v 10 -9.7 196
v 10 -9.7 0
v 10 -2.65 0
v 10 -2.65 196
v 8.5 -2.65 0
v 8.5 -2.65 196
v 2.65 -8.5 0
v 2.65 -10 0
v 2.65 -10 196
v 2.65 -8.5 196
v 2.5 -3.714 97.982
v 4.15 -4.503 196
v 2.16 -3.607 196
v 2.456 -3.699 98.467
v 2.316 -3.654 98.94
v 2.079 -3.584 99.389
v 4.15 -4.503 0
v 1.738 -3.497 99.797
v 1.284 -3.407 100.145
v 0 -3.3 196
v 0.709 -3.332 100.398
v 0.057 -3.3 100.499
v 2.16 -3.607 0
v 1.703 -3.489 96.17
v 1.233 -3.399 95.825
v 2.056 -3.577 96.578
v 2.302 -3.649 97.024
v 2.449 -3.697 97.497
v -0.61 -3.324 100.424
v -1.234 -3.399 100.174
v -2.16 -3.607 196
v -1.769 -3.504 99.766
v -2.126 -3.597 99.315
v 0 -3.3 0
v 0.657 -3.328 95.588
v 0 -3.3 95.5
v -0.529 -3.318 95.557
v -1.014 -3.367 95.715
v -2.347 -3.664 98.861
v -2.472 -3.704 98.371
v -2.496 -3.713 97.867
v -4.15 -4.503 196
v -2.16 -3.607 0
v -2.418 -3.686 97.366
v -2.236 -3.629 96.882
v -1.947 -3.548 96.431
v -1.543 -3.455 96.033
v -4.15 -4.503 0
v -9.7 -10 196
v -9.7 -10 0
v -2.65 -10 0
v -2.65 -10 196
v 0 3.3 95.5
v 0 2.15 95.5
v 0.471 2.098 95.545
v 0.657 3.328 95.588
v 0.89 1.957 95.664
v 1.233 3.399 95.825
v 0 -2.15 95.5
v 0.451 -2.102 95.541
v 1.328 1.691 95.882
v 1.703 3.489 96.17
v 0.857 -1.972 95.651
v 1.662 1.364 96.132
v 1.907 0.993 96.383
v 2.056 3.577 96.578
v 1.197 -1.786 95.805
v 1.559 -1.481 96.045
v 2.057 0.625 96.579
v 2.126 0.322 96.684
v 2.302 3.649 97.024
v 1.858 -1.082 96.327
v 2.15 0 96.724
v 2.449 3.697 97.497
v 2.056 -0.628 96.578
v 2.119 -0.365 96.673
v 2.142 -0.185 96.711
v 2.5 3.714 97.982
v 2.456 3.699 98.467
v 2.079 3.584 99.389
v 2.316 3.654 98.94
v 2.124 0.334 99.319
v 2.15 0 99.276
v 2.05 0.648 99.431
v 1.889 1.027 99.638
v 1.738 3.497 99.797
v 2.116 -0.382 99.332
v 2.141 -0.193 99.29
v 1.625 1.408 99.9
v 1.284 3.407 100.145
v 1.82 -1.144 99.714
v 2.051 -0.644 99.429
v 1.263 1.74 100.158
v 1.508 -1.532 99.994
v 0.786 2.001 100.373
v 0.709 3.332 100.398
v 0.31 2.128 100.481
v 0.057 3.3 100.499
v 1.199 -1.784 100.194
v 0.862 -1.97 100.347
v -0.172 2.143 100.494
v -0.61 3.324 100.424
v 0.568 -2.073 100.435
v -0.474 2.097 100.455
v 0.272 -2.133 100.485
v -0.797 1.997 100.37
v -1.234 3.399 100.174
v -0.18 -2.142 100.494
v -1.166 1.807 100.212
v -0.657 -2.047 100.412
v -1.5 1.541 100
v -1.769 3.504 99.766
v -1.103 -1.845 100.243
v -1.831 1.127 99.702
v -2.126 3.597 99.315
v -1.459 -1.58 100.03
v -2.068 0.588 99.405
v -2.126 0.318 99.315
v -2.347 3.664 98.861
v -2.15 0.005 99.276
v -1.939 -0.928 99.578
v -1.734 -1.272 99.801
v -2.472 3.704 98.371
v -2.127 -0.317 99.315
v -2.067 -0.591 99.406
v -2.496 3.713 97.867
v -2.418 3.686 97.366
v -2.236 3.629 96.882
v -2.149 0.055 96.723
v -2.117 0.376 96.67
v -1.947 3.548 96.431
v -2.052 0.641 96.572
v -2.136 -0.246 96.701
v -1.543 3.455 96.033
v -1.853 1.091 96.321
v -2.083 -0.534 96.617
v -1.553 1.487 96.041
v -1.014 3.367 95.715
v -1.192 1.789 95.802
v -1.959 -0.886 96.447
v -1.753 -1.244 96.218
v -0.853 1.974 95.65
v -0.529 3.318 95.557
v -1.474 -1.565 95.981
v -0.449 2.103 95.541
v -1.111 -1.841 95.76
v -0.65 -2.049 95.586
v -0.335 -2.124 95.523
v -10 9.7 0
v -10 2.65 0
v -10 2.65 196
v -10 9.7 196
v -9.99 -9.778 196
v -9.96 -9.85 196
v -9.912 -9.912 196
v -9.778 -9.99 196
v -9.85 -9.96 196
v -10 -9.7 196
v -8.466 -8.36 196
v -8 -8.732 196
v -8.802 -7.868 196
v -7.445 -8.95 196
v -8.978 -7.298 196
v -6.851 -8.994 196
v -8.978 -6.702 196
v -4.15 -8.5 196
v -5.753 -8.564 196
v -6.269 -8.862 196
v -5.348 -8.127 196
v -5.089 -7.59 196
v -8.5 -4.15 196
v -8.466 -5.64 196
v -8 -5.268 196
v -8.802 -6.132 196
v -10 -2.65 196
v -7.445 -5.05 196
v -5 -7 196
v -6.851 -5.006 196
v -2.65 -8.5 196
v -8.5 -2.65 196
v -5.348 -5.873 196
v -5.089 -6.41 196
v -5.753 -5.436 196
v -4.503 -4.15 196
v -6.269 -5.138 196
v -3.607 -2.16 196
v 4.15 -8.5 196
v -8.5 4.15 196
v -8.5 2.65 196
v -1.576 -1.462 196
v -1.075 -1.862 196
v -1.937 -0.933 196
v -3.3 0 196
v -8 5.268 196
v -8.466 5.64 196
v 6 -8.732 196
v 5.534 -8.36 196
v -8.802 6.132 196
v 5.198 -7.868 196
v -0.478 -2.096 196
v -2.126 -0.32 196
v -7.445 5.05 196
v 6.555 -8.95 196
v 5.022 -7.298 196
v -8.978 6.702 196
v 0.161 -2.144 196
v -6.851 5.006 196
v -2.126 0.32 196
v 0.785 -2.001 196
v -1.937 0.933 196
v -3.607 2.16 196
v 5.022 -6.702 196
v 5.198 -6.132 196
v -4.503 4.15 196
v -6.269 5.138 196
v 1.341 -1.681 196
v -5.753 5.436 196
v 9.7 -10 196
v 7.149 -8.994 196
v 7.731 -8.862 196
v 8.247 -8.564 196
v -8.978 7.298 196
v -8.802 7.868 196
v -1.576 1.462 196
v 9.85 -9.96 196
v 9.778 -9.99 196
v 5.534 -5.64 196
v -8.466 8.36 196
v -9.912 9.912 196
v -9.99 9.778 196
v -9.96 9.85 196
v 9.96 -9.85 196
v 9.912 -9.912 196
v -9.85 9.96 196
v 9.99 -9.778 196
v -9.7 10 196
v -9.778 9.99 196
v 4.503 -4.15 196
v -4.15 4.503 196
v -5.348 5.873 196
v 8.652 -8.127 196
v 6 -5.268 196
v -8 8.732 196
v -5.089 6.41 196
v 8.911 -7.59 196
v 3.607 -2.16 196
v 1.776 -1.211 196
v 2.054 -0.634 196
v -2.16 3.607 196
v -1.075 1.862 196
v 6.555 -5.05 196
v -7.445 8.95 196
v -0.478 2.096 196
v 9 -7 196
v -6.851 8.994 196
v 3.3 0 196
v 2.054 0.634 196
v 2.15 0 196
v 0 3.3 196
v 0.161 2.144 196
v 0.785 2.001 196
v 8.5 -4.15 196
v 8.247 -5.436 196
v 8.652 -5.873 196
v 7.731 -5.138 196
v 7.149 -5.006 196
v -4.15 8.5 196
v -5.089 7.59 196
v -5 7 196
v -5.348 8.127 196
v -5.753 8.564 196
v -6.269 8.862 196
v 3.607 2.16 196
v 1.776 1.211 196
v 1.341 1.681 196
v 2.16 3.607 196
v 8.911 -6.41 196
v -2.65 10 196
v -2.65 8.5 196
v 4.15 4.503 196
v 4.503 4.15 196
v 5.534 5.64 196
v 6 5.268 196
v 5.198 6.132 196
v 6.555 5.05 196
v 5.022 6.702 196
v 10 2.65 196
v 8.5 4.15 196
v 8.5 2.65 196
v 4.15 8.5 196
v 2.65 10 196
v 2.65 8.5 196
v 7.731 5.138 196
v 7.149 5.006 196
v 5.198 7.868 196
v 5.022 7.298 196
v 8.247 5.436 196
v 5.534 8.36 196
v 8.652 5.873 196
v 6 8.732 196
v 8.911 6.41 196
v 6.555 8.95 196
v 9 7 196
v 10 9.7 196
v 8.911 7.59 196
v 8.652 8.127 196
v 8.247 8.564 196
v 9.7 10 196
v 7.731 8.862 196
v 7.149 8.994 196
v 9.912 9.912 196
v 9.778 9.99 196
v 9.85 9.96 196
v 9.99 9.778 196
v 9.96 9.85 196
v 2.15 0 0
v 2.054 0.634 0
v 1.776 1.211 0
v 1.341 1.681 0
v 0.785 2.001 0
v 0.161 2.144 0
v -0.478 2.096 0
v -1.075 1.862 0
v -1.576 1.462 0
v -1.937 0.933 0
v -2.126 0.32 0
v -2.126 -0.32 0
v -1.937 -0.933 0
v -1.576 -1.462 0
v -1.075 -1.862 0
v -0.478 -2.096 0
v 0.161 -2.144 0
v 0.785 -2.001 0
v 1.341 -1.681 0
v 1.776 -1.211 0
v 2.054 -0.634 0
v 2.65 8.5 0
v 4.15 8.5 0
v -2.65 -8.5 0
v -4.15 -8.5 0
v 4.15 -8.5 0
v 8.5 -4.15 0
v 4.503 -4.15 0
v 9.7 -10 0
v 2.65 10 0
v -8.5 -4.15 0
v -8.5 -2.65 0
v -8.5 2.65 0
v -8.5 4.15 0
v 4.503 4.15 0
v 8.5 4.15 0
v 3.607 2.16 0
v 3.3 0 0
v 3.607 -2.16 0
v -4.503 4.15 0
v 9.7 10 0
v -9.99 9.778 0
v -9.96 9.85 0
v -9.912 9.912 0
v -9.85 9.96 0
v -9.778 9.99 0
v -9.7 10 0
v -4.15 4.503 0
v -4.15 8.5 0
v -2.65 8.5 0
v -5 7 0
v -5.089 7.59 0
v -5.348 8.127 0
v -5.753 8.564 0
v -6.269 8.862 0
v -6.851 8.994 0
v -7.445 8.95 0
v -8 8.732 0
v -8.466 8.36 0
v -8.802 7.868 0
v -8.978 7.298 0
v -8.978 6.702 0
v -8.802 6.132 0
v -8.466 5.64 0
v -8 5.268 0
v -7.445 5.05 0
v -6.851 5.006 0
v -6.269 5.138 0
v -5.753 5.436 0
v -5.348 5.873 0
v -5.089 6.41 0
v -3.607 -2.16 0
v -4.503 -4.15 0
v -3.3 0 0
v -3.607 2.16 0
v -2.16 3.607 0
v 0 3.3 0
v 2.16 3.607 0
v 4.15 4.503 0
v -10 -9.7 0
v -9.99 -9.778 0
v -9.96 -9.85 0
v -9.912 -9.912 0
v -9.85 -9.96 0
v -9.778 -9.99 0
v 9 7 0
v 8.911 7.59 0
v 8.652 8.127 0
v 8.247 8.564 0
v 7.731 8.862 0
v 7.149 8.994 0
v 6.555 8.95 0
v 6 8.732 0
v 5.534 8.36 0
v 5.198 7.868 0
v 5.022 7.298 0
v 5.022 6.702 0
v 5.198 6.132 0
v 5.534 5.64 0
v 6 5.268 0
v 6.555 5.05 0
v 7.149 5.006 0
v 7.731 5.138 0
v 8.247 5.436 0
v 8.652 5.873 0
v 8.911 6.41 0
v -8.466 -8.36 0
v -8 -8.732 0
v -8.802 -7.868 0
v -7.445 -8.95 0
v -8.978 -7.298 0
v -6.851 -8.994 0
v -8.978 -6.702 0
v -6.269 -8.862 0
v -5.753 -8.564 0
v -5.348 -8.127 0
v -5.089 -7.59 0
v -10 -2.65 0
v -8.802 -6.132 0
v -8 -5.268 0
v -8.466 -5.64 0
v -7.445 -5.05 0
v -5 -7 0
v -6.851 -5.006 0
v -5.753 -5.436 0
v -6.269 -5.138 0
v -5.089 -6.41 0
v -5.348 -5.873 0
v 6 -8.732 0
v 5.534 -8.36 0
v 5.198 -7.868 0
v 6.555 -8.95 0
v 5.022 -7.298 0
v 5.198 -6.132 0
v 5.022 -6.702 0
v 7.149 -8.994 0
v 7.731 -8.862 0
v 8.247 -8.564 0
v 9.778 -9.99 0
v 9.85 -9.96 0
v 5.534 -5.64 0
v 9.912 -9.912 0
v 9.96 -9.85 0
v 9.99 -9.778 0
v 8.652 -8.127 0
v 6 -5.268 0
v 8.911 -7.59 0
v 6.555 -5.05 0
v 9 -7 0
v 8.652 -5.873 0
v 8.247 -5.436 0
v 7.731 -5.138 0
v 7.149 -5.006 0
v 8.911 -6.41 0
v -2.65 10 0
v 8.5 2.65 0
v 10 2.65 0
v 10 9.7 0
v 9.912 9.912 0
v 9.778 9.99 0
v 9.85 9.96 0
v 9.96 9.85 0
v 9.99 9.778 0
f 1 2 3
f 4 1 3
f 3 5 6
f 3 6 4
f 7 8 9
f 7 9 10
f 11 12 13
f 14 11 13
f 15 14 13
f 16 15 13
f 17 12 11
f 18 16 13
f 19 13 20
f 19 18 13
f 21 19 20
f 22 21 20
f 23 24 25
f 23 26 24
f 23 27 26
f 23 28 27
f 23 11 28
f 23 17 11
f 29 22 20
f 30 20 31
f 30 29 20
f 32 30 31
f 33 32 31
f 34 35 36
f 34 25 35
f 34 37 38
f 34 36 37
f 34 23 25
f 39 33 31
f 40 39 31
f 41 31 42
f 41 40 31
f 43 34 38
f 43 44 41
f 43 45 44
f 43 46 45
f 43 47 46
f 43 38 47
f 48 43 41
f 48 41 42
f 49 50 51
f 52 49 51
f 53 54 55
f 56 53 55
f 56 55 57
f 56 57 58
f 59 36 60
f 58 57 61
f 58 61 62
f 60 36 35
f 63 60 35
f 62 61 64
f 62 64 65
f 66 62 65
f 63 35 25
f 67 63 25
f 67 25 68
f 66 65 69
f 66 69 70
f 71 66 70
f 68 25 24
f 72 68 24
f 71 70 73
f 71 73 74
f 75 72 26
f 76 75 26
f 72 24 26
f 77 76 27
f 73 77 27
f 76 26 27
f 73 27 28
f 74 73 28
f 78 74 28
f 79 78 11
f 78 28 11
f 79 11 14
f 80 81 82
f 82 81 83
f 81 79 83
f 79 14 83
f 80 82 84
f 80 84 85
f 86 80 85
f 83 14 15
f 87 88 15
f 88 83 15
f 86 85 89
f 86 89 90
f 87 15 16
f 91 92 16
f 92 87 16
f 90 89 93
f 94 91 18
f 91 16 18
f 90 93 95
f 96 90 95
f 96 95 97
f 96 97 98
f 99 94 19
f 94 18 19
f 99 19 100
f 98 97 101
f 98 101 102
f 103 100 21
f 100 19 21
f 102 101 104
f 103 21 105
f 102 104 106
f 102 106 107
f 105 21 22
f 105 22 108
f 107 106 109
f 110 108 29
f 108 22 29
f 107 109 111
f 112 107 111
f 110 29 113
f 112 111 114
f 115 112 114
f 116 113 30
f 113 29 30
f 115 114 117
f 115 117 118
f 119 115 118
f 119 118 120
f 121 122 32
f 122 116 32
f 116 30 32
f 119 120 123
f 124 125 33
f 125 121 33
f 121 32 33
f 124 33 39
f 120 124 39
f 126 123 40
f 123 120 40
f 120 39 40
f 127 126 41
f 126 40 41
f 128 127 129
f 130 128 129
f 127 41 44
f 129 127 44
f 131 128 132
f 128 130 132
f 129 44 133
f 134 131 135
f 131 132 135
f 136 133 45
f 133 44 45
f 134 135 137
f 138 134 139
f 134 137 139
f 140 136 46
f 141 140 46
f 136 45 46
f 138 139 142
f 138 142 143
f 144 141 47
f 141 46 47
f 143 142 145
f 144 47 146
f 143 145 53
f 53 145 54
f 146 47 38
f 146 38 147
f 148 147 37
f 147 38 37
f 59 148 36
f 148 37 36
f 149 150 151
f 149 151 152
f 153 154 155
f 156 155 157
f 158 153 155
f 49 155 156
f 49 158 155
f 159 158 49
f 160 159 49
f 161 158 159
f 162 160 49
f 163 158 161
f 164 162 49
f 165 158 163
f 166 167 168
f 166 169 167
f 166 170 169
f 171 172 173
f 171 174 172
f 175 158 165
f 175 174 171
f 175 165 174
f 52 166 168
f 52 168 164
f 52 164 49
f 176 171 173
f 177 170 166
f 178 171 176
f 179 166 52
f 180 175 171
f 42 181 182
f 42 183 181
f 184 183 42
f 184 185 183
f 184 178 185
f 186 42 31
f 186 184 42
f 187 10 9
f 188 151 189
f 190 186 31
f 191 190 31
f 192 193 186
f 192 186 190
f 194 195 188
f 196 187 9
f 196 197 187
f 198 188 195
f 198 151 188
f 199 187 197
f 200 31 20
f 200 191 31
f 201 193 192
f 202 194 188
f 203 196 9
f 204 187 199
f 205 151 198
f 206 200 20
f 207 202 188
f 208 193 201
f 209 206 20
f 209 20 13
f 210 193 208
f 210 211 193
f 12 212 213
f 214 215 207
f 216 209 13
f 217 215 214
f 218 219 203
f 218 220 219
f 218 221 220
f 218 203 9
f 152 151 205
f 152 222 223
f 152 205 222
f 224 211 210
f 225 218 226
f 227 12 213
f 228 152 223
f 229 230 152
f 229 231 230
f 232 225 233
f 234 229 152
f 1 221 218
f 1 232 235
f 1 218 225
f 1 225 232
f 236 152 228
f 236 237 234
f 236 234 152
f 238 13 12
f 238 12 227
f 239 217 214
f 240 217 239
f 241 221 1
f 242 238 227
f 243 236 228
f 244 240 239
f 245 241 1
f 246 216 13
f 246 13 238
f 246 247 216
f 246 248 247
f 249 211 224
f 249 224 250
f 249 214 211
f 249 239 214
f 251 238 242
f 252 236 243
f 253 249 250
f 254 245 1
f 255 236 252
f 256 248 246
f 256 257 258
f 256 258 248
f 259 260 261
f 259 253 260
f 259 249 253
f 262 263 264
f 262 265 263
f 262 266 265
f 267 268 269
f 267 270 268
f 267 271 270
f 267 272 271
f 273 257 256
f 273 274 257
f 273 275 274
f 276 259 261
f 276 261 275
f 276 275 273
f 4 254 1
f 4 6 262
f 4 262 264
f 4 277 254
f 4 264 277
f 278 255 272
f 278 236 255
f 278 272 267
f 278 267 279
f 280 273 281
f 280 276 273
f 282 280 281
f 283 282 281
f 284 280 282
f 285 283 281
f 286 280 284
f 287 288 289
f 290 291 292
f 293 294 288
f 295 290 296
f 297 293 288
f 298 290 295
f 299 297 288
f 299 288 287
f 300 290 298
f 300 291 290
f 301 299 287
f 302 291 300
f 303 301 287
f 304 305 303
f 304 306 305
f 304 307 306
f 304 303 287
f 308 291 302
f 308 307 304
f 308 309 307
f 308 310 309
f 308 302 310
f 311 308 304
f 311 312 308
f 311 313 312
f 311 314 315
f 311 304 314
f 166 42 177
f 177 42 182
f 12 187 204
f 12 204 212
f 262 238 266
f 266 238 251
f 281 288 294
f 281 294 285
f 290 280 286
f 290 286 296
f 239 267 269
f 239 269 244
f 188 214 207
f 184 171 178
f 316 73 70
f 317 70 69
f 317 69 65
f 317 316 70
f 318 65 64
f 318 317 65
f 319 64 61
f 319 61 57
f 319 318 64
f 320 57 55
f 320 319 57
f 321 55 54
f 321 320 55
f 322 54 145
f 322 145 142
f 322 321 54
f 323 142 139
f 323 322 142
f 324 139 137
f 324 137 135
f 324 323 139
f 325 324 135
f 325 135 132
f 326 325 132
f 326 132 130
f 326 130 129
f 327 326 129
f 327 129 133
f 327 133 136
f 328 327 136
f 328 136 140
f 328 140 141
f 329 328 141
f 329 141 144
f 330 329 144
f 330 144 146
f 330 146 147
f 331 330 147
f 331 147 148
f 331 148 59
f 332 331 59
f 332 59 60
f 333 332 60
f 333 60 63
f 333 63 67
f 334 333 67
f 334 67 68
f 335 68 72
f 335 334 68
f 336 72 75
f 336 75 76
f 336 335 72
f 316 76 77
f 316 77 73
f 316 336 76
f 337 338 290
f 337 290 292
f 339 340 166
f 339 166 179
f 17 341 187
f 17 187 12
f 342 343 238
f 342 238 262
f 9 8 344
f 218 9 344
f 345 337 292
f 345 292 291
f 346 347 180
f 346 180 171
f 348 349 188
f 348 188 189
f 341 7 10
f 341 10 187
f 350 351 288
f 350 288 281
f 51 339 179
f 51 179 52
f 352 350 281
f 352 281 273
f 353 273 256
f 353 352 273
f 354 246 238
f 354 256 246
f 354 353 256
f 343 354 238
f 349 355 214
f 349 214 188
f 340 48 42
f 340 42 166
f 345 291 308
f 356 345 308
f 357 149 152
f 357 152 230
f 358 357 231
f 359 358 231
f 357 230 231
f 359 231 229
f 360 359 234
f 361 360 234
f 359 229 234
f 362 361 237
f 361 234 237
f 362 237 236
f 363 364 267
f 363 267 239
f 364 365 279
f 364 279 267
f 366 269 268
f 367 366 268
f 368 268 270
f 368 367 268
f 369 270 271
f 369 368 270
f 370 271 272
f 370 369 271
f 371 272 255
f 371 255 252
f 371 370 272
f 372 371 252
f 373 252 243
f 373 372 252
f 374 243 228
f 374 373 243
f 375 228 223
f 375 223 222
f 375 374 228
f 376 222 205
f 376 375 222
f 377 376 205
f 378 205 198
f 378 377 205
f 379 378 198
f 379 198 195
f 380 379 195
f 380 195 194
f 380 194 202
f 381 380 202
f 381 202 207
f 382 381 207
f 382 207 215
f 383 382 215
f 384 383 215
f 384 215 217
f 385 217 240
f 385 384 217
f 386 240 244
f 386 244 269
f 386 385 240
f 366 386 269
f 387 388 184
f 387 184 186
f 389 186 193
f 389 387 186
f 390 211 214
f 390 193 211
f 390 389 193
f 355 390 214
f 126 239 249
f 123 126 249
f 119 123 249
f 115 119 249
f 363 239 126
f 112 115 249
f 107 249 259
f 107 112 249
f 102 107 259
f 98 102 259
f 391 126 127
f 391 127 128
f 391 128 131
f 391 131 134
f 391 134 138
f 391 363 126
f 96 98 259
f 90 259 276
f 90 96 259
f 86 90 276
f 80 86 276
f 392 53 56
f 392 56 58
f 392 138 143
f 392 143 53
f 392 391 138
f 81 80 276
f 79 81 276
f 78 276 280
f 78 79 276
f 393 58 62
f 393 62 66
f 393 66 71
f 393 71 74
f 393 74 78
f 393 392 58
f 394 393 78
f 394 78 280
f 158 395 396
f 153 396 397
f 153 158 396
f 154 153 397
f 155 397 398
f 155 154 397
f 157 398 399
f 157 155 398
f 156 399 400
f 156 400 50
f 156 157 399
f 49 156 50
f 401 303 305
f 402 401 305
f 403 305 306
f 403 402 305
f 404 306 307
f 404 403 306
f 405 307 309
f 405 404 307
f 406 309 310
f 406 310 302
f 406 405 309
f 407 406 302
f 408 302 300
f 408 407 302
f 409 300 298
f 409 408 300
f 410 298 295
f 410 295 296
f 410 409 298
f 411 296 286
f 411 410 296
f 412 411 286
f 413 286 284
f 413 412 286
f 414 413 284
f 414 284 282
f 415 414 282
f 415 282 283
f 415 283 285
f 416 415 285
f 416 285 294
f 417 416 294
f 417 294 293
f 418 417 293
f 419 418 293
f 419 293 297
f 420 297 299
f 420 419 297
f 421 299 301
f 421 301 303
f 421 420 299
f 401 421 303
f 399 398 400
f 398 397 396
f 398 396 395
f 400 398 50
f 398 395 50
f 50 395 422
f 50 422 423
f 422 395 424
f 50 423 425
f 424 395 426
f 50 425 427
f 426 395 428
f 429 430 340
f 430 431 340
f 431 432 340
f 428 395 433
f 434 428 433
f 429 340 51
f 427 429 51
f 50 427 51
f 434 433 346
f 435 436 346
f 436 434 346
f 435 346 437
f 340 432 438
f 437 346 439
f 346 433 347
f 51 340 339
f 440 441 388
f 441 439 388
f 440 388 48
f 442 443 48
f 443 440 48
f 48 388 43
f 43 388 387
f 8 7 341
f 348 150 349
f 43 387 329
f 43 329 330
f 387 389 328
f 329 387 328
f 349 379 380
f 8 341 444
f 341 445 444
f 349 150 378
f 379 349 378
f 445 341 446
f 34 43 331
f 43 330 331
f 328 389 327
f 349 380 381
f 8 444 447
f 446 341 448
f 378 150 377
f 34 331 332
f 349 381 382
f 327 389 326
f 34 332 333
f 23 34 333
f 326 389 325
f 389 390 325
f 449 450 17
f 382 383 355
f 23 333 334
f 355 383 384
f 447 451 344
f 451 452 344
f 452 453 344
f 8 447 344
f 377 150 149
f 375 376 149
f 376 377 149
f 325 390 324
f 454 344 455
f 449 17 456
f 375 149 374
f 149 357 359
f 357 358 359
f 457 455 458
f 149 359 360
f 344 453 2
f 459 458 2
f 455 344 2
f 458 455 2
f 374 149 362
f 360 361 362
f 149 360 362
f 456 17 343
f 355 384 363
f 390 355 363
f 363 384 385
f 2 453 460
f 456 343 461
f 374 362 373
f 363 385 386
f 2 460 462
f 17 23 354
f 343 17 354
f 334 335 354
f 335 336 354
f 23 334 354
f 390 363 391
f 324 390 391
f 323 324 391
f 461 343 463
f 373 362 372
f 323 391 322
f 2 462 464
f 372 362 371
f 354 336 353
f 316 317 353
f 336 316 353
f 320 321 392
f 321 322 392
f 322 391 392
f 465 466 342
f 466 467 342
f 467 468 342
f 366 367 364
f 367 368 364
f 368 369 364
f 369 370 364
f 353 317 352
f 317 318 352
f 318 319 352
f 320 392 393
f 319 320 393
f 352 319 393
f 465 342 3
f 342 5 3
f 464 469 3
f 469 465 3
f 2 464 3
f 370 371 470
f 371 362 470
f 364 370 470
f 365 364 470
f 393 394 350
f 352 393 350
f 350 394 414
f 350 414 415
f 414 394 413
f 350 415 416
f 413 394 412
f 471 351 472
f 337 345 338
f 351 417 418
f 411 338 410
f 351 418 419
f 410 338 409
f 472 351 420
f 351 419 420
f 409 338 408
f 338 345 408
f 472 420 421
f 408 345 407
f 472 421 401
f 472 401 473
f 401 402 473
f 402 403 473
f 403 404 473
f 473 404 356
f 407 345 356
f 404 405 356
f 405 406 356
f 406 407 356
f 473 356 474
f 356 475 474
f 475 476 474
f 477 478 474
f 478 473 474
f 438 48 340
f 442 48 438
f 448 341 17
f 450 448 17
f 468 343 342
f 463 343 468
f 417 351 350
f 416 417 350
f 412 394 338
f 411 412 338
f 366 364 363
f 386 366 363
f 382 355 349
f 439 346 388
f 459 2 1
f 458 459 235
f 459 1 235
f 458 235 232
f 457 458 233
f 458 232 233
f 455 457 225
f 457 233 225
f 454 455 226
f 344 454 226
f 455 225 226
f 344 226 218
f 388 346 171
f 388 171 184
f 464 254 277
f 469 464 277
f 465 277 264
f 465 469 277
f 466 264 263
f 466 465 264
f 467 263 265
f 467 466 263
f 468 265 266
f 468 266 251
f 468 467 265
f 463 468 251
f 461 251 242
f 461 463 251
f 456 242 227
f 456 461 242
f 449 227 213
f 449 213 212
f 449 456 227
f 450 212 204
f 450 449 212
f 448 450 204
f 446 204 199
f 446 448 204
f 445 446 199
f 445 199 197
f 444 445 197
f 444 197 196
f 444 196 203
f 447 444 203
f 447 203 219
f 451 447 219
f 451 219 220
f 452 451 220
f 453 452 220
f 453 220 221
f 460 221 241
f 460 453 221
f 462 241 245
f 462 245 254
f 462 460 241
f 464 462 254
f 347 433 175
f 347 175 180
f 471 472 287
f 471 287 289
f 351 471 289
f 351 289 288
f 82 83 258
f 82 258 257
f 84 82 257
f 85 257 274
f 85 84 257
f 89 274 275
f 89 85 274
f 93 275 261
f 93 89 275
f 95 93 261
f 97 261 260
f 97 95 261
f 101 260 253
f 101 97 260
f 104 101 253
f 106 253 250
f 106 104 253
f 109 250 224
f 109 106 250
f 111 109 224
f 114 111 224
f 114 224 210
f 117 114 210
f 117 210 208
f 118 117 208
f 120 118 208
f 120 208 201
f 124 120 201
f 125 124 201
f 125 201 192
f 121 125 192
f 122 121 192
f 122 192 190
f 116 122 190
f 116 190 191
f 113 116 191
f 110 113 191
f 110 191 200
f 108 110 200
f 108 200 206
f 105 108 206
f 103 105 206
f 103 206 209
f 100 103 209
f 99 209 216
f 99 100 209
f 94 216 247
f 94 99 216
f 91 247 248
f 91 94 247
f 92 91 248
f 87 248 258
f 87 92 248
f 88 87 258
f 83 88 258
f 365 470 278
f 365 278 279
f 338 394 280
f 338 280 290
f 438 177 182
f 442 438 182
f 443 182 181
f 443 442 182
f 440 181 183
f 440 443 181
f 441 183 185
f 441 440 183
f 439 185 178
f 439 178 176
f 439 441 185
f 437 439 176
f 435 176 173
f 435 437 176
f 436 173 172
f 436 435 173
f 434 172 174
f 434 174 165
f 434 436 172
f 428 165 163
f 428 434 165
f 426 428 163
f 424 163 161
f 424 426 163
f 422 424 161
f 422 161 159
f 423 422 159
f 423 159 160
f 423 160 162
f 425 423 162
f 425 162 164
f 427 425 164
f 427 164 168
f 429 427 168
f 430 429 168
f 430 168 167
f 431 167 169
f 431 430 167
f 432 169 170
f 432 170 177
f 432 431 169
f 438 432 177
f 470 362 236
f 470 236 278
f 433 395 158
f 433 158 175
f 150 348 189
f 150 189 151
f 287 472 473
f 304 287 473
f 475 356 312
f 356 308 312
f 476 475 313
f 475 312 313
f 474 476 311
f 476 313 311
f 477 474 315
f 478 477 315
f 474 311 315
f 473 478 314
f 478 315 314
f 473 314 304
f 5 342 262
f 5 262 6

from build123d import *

# Parameters (mm, degrees)
SKETCH_1_W               = 20
SKETCH_1_H               = 20
SKETCH_1_R               = 2
SKETCH_1_R_2             = 2.15
EXTRUDE_1_DEPTH          = 196
CUT_EXTRUDE_1_REACH      = 198.51
PATTERN_CIRCULAR_1_COUNT = 4
FILLET_1_R               = 0.3
SKETCH_4_R               = 2.5
CUT_EXTRUDE_4_DEPTH      = 198.271386673


with BuildPart() as part:
    # 스케치1 → 보스-돌출1 (new body)
    with BuildSketch(Plane.XY):
        Rectangle(SKETCH_1_W, SKETCH_1_H)
        with Locations((-7, -7)):
            Circle(SKETCH_1_R, mode=Mode.SUBTRACT)
        with Locations((7, -7)):
            Circle(SKETCH_1_R, mode=Mode.SUBTRACT)
        with Locations((-7, 7)):
            Circle(SKETCH_1_R, mode=Mode.SUBTRACT)
        Circle(SKETCH_1_R_2, mode=Mode.SUBTRACT)
        with Locations((7, 7)):
            Circle(SKETCH_1_R, mode=Mode.SUBTRACT)
    extrude(amount=EXTRUDE_1_DEPTH)

    # 스케치1<3> → 컷-돌출1 (cut, up to next)
    with BuildSketch(Plane.XY, mode=Mode.PRIVATE) as cut_extrude_1_sk1:
        with BuildLine():
            Line((-8.5, 2.65), (-10, 2.65))
            Line((-10, 2.65), (-10, -2.65))
            Line((-10, -2.65), (-8.5, -2.65))
            Line((-8.5, -2.65), (-8.5, -4.15))
            Line((-8.5, -4.15), (-4.503166667, -4.15))
            ThreePointArc((-4.503166667, -4.15), (-3.3, 0), (-4.503166667, 4.15))
            Line((-4.503166667, 4.15), (-8.5, 4.15))
            Line((-8.5, 4.15), (-8.5, 2.65))
        make_face()
    cut_extrude_1_tool1 = extrude(cut_extrude_1_sk1.sketch, amount=CUT_EXTRUDE_1_REACH, mode=Mode.PRIVATE) & part.part
    cut_extrude_1 = cut_extrude_1_tool1.solids().sort_by_distance((-6.606913, 0, 0))[0]
    add(cut_extrude_1, mode=Mode.SUBTRACT)

    # 원형 패턴1: 컷-돌출1 ×4 about axis
    pattern_circular_1_axis = Axis((0, 0, 196), (0, 0, -1))
    for i in range(1, PATTERN_CIRCULAR_1_COUNT):
        add(cut_extrude_1.rotate(pattern_circular_1_axis, i * 360 / PATTERN_CIRCULAR_1_COUNT), mode=Mode.SUBTRACT)

    # 필렛1
    fillet_1_edges = [part.edges().sort_by_distance(p)[0] for p in [
        (10, -10, 98),
        (-10, -10, 98),
        (-10, 10, 98),
        (10, 10, 98),
    ]]
    fillet(fillet_1_edges, radius=FILLET_1_R)

    # 스케치4 → 컷-돌출4 (cut, through all)
    with BuildSketch(Plane.XZ.offset(10)):
        with Locations((0, 98)):
            Circle(SKETCH_4_R)
    extrude(amount=-CUT_EXTRUDE_4_DEPTH, mode=Mode.SUBTRACT)


solid = part.part
